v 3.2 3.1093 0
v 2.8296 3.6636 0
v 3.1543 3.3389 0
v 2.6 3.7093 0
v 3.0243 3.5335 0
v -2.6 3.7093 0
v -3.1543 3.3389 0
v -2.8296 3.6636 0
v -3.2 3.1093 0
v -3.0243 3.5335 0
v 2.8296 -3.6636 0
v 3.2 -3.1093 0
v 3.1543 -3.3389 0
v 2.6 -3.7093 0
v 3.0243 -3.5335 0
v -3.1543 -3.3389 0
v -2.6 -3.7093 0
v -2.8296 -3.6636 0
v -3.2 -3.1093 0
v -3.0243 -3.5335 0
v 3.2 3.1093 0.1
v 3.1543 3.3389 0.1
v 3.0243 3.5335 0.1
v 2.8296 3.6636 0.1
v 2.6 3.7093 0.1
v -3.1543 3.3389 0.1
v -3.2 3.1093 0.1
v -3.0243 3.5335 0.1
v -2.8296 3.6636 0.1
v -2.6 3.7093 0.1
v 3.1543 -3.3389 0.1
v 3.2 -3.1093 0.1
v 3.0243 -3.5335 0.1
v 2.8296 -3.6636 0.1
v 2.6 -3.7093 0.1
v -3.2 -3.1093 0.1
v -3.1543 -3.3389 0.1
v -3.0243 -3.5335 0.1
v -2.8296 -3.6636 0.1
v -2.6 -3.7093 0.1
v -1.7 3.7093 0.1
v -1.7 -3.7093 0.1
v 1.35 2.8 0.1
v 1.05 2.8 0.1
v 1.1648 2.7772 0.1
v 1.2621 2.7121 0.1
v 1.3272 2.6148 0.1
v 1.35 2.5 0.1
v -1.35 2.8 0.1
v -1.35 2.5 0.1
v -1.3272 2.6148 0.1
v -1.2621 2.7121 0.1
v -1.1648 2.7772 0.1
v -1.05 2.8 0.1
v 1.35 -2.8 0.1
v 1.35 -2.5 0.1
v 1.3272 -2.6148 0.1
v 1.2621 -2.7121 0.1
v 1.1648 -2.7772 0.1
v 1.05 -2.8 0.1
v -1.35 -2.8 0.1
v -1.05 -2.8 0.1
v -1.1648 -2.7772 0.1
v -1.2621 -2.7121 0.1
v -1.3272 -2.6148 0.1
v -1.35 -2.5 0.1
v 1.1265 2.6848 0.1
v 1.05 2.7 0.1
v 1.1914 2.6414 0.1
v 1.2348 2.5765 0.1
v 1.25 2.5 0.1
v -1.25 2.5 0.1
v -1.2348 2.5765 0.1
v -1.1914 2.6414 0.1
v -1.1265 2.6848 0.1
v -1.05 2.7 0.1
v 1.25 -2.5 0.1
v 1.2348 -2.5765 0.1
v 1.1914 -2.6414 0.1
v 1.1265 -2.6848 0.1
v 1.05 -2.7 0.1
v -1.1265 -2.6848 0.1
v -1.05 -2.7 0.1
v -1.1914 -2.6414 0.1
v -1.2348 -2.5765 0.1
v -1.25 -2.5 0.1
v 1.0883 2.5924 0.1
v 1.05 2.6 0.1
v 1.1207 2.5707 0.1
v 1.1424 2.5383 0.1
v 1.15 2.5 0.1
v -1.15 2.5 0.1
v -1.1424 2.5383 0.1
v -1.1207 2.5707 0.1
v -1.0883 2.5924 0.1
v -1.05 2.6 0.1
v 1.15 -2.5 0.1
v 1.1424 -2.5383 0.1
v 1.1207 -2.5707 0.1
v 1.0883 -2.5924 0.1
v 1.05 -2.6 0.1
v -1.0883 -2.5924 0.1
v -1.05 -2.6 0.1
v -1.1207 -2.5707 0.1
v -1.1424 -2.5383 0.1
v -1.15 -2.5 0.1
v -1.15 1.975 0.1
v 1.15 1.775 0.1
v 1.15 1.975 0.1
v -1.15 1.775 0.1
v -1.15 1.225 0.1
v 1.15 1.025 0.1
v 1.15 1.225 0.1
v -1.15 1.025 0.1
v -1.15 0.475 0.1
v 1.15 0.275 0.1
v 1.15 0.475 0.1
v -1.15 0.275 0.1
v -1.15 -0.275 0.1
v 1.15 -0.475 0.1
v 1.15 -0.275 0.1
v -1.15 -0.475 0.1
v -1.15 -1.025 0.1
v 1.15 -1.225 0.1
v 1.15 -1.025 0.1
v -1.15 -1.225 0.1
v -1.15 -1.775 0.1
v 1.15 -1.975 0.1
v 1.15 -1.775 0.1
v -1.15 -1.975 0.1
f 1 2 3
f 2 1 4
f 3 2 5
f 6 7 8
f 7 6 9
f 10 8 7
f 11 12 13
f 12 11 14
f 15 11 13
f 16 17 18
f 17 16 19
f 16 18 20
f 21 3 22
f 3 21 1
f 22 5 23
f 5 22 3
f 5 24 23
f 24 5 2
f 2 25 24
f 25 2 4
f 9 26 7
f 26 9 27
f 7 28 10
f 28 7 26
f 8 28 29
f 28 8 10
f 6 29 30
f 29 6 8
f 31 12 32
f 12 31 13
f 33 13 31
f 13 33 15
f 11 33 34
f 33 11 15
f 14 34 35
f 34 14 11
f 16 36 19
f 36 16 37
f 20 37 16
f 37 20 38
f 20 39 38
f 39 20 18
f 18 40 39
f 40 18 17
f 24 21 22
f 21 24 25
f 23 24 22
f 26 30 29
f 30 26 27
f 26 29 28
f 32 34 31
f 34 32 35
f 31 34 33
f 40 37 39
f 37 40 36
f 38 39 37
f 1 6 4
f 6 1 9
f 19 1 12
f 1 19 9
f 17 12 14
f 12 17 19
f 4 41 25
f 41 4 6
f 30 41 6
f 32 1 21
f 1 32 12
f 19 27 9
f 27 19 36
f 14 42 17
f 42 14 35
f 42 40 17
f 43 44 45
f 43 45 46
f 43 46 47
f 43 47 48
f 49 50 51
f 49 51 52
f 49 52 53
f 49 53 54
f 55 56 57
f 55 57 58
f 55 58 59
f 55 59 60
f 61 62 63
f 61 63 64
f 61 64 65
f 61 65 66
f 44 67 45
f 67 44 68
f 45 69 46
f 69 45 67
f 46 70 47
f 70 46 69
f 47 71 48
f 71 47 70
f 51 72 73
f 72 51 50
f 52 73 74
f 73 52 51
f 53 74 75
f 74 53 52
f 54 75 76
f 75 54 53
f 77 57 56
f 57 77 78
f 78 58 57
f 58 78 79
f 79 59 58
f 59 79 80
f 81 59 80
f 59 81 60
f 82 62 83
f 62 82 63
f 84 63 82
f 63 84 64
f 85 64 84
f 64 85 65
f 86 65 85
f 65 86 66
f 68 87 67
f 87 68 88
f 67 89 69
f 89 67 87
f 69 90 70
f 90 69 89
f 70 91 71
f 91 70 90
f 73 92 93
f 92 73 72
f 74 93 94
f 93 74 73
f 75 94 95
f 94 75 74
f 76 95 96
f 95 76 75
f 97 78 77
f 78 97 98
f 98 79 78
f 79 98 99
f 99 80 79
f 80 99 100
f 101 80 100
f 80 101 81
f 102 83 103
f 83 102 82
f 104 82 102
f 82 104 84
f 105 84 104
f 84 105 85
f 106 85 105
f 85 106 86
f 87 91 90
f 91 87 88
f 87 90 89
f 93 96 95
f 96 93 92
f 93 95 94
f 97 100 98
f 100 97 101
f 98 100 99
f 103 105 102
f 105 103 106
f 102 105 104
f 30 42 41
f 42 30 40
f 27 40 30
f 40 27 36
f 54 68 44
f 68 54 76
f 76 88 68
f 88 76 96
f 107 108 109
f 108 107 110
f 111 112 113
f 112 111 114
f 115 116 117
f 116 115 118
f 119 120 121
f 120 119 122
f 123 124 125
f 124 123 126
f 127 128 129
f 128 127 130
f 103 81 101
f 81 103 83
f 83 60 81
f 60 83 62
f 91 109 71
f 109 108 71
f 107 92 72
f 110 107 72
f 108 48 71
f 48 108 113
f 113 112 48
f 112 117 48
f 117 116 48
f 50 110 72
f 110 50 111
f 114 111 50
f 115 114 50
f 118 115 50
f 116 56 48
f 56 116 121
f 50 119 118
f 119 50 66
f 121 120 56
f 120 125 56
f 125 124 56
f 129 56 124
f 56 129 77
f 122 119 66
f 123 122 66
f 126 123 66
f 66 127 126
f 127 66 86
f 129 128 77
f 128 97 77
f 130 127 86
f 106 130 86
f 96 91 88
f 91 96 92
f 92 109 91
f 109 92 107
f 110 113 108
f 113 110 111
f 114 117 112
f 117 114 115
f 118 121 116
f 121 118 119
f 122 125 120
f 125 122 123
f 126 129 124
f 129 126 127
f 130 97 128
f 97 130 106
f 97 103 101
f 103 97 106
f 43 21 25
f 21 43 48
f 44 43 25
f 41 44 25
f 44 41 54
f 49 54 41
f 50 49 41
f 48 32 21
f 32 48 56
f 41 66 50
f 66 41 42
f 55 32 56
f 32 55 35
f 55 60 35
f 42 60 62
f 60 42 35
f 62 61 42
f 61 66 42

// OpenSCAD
// file: ../p/1-4ring2.scad
use <../lib.scad>
function ldraw_lib__1_4ring2() = [
// 0 Ring  2 x 0.25
// 0 Name: 1-4ring2.dat
// 0 Author: Franklin W. Cain [fwcain]
// 0 !LDRAW_ORG Primitive UPDATE 2015-01
// 0 !LICENSE Licensed under CC BY 2.0 and CC BY 4.0 : see CAreadme.txt
// 
// 0 BFC CERTIFY CCW
  [0,"BFC","CERTIFY"],
  [0,"BFC","CCW"],
// 
// 0 !HISTORY 2001-12-31 [PTadmin] Official Update 2001-03
// 0 !HISTORY 2007-06-22 [PTadmin] Header formatted for Contributor Agreement
// 0 !HISTORY 2008-07-01 [PTadmin] Official Update 2008-01
// 0 !HISTORY 2012-02-16 [Philo] Changed to CCW
// 0 !HISTORY 2012-03-30 [PTadmin] Official Update 2012-01
// 0 !HISTORY 2014-12-25 [MMR1988] Fixed a rounding issue
// 0 !HISTORY 2015-10-11 [PTadmin] Official Update 2015-01
// 
// 
// 4 16 3 0 0 2.7717 0 1.1481 1.8478 0 0.7654 2 0 0
  [4,16,3,0,0,2.7717,0,1.1481,1.8478,0,0.7654,2,0,0],
// 4 16 2.7717 0 1.1481 2.1213 0 2.1213 1.4142 0 1.4142 1.8478 0 0.7654
  [4,16,2.7717,0,1.1481,2.1213,0,2.1213,1.4142,0,1.4142,1.8478,0,0.7654],
// 4 16 2.1213 0 2.1213 1.1481 0 2.7717 0.7654 0 1.8478 1.4142 0 1.4142
  [4,16,2.1213,0,2.1213,1.1481,0,2.7717,0.7654,0,1.8478,1.4142,0,1.4142],
// 4 16 1.1481 0 2.7717 0 0 3 0 0 2 0.7654 0 1.8478
  [4,16,1.1481,0,2.7717,0,0,3,0,0,2,0.7654,0,1.8478],
// 0 // Build by Primitive Generator 2
];
makepoly(ldraw_lib__1_4ring2(), line=0.2);
// file: ../p/1-4ring1.scad
use <../lib.scad>
function ldraw_lib__1_4ring1() = [
// 0 Ring  1 x 0.25
// 0 Name: 1-4ring1.dat
// 0 Author: Chris Dee [cwdee]
// 0 !LDRAW_ORG Primitive UPDATE 2012-01
// 0 !LICENSE Licensed under CC BY 2.0 and CC BY 4.0 : see CAreadme.txt
// 
// 0 BFC CERTIFY CCW
  [0,"BFC","CERTIFY"],
  [0,"BFC","CCW"],
// 
// 0 !HISTORY 2000-05-07 [PTadmin] Official Update 2000-01
// 0 !HISTORY 2002-11-22 [hafhead] Added BFC statement
// 0 !HISTORY 2002-11-30 [PTadmin] Official Update 2002-05
// 0 !HISTORY 2007-06-22 [PTadmin] Header formatted for Contributor Agreement
// 0 !HISTORY 2008-07-01 [PTadmin] Official Update 2008-01
// 0 !HISTORY 2012-02-16 [Philo] Changed to CCW
// 0 !HISTORY 2012-03-30 [PTadmin] Official Update 2012-01
// 
// 
// 4 16 2 0 0 1.8478 0 0.7654 0.9239 0 0.3827 1 0 0
  [4,16,2,0,0,1.8478,0,0.7654,0.9239,0,0.3827,1,0,0],
// 4 16 1.8478 0 0.7654 1.4142 0 1.4142 0.7071 0 0.7071 0.9239 0 0.3827
  [4,16,1.8478,0,0.7654,1.4142,0,1.4142,0.7071,0,0.7071,0.9239,0,0.3827],
// 4 16 1.4142 0 1.4142 0.7654 0 1.8478 0.3827 0 0.9239 0.7071 0 0.7071
  [4,16,1.4142,0,1.4142,0.7654,0,1.8478,0.3827,0,0.9239,0.7071,0,0.7071],
// 4 16 0.7654 0 1.8478 0 0 2 0 0 1 0.3827 0 0.9239
  [4,16,0.7654,0,1.8478,0,0,2,0,0,1,0.3827,0,0.9239],
];
makepoly(ldraw_lib__1_4ring1(), line=0.2);
// file: ../p/1-4ndis.scad
use <../lib.scad>
function ldraw_lib__1_4ndis() = [
// 0 Disc Negative 0.25
// 0 Name: 1-4ndis.dat
// 0 Author: James Jessiman
// 0 !LDRAW_ORG Primitive UPDATE 2012-01
// 0 !LICENSE Licensed under CC BY 2.0 and CC BY 4.0 : see CAreadme.txt
// 
// 0 BFC CERTIFY CCW
  [0,"BFC","CERTIFY"],
  [0,"BFC","CCW"],
// 
// 0 !HISTORY 2002-03-23 [sbliss] Added BFC Statement
// 0 !HISTORY 2002-04-25 [PTadmin] Official Update 2002-02
// 0 !HISTORY 2007-06-22 [PTadmin] Header formatted for Contributor Agreement
// 0 !HISTORY 2008-07-01 [PTadmin] Official Update 2008-01
// 0 !HISTORY 2012-02-16 [Philo] Changed to CCW
// 0 !HISTORY 2012-03-30 [PTadmin] Official Update 2012-01
// 
// 
// 3 16 0.9239 0 0.3827 1 0 0 1 0 1
  [3,16,0.9239,0,0.3827,1,0,0,1,0,1],
// 3 16 0.7071 0 0.7071 0.9239 0 0.3827 1 0 1
  [3,16,0.7071,0,0.7071,0.9239,0,0.3827,1,0,1],
// 3 16 0.3827 0 0.9239 0.7071 0 0.7071 1 0 1
  [3,16,0.3827,0,0.9239,0.7071,0,0.7071,1,0,1],
// 3 16 0 0 1 0.3827 0 0.9239 1 0 1
  [3,16,0,0,1,0.3827,0,0.9239,1,0,1],
];
makepoly(ldraw_lib__1_4ndis(), line=0.2);
// file: ../p/1-4cyli.scad
use <../lib.scad>
function ldraw_lib__1_4cyli() = [
// 0 Cylinder 0.25
// 0 Name: 1-4cyli.dat
// 0 Author: James Jessiman
// 0 !LDRAW_ORG Primitive UPDATE 2012-01
// 0 !LICENSE Licensed under CC BY 2.0 and CC BY 4.0 : see CAreadme.txt
// 
// 0 BFC CERTIFY CCW
  [0,"BFC","CERTIFY"],
  [0,"BFC","CCW"],
// 
// 0 !HISTORY 2002-03-23 [sbliss] Added BFC statement.
// 0 !HISTORY 2002-04-25 [PTadmin] Official Update 2002-02
// 0 !HISTORY 2007-06-22 [PTadmin] Header formatted for Contributor Agreement
// 0 !HISTORY 2008-07-01 [PTadmin] Official Update 2008-01
// 0 !HISTORY 2012-02-16 [Philo] Changed to CCW
// 0 !HISTORY 2012-03-30 [PTadmin] Official Update 2012-01
// 
// 
// 4 16 1 1 0 0.9239 1 0.3827 0.9239 0 0.3827 1 0 0
  [4,16,1,1,0,0.9239,1,0.3827,0.9239,0,0.3827,1,0,0],
// 5 24 1 0 0 1 1 0 0.9239 0 0.3827 1 0 -1
  [5,24,1,0,0,1,1,0,0.9239,0,0.3827,1,0,-1],
// 4 16 0.9239 1 0.3827 0.7071 1 0.7071 0.7071 0 0.7071 0.9239 0 0.3827
  [4,16,0.9239,1,0.3827,0.7071,1,0.7071,0.7071,0,0.7071,0.9239,0,0.3827],
// 5 24 0.9239 0 0.3827 0.9239 1 0.3827 0.7071 0 0.7071 1 0 0
  [5,24,0.9239,0,0.3827,0.9239,1,0.3827,0.7071,0,0.7071,1,0,0],
// 4 16 0.7071 1 0.7071 0.3827 1 0.9239 0.3827 0 0.9239 0.7071 0 0.7071
  [4,16,0.7071,1,0.7071,0.3827,1,0.9239,0.3827,0,0.9239,0.7071,0,0.7071],
// 5 24 0.7071 0 0.7071 0.7071 1 0.7071 0.3827 0 0.9239 0.9239 0 0.3827
  [5,24,0.7071,0,0.7071,0.7071,1,0.7071,0.3827,0,0.9239,0.9239,0,0.3827],
// 4 16 0.3827 1 0.9239 0 1 1 0 0 1 0.3827 0 0.9239
  [4,16,0.3827,1,0.9239,0,1,1,0,0,1,0.3827,0,0.9239],
// 5 24 0.3827 0 0.9239 0.3827 1 0.9239 0 0 1 0.7071 0 0.7071
  [5,24,0.3827,0,0.9239,0.3827,1,0.9239,0,0,1,0.7071,0,0.7071],
// 5 24 0 0 1 0 1 1 0.3827 0 0.9239 -1 0 1
  [5,24,0,0,1,0,1,1,0.3827,0,0.9239,-1,0,1],
];
makepoly(ldraw_lib__1_4cyli(), line=0.2);
// file: ../p/1-4chrd.scad
use <../lib.scad>
function ldraw_lib__1_4chrd() = [
// 0 Chord 0.25
// 0 Name: 1-4chrd.dat
// 0 Author: Tony Hafner [hafhead]
// 0 !LDRAW_ORG Primitive UPDATE 2012-02
// 0 !LICENSE Licensed under CC BY 2.0 and CC BY 4.0 : see CAreadme.txt
// 
// 0 BFC CERTIFY CCW
  [0,"BFC","CERTIFY"],
  [0,"BFC","CCW"],
// 
// 0 !HISTORY 2004-04-22 [PTadmin] Official Update 2004-02
// 0 !HISTORY 2007-10-09 [PTadmin] Header formatted for Contributor Agreement
// 0 !HISTORY 2008-07-01 [PTadmin] Official Update 2008-01
// 0 !HISTORY 2012-08-02 [MMR1988] Re-creation with PrimGen2 and Rectifier
// 0 !HISTORY 2012-08-09 [PTadmin] Official Update 2012-02
// 
// 
// 4 16 0.9239 0 0.3827 0.3827 0 0.9239 0 0 1 1 0 0
  [4,16,0.9239,0,0.3827,0.3827,0,0.9239,0,0,1,1,0,0],
// 3 16 0.7071 0 0.7071 0.3827 0 0.9239 0.9239 0 0.3827
  [3,16,0.7071,0,0.7071,0.3827,0,0.9239,0.9239,0,0.3827],
];
makepoly(ldraw_lib__1_4chrd(), line=0.2);
// main file
use <../lib.scad>
use <6142622g.scad>
function ldraw_lib__6142622h() = [
// 0 Sticker  1.0 x  0.9 with Dark Grey Exhaust Pipe on Black and Yellow Background Left
// 0 Name: 6142622h.dat
// 0 Author: Massimo Maso [Sirio]
// 0 !LDRAW_ORG Part UPDATE 2022-03
// 0 !LICENSE Licensed under CC BY 2.0 and CC BY 4.0 : see CAreadme.txt
// 
// 0 BFC CERTIFY CCW
  [0,"BFC","CERTIFY"],
  [0,"BFC","CCW"],
// 
// 0 !KEYWORDS Chevrolet, Corvette, Set 75870, Speed Champions
// 
// 0 !HISTORY 2022-05-07 [PTadmin] Official Update 2022-03
// 
// 
// 1 16 0 0 0 -1 0 0 0 1 0 0 0 1 6142622g.dat
  [1,16,0,0,0,-1,0,0,0,1,0,0,0,1, ldraw_lib__6142622g()],
];
makepoly(ldraw_lib__6142622h(), line=0.2);
